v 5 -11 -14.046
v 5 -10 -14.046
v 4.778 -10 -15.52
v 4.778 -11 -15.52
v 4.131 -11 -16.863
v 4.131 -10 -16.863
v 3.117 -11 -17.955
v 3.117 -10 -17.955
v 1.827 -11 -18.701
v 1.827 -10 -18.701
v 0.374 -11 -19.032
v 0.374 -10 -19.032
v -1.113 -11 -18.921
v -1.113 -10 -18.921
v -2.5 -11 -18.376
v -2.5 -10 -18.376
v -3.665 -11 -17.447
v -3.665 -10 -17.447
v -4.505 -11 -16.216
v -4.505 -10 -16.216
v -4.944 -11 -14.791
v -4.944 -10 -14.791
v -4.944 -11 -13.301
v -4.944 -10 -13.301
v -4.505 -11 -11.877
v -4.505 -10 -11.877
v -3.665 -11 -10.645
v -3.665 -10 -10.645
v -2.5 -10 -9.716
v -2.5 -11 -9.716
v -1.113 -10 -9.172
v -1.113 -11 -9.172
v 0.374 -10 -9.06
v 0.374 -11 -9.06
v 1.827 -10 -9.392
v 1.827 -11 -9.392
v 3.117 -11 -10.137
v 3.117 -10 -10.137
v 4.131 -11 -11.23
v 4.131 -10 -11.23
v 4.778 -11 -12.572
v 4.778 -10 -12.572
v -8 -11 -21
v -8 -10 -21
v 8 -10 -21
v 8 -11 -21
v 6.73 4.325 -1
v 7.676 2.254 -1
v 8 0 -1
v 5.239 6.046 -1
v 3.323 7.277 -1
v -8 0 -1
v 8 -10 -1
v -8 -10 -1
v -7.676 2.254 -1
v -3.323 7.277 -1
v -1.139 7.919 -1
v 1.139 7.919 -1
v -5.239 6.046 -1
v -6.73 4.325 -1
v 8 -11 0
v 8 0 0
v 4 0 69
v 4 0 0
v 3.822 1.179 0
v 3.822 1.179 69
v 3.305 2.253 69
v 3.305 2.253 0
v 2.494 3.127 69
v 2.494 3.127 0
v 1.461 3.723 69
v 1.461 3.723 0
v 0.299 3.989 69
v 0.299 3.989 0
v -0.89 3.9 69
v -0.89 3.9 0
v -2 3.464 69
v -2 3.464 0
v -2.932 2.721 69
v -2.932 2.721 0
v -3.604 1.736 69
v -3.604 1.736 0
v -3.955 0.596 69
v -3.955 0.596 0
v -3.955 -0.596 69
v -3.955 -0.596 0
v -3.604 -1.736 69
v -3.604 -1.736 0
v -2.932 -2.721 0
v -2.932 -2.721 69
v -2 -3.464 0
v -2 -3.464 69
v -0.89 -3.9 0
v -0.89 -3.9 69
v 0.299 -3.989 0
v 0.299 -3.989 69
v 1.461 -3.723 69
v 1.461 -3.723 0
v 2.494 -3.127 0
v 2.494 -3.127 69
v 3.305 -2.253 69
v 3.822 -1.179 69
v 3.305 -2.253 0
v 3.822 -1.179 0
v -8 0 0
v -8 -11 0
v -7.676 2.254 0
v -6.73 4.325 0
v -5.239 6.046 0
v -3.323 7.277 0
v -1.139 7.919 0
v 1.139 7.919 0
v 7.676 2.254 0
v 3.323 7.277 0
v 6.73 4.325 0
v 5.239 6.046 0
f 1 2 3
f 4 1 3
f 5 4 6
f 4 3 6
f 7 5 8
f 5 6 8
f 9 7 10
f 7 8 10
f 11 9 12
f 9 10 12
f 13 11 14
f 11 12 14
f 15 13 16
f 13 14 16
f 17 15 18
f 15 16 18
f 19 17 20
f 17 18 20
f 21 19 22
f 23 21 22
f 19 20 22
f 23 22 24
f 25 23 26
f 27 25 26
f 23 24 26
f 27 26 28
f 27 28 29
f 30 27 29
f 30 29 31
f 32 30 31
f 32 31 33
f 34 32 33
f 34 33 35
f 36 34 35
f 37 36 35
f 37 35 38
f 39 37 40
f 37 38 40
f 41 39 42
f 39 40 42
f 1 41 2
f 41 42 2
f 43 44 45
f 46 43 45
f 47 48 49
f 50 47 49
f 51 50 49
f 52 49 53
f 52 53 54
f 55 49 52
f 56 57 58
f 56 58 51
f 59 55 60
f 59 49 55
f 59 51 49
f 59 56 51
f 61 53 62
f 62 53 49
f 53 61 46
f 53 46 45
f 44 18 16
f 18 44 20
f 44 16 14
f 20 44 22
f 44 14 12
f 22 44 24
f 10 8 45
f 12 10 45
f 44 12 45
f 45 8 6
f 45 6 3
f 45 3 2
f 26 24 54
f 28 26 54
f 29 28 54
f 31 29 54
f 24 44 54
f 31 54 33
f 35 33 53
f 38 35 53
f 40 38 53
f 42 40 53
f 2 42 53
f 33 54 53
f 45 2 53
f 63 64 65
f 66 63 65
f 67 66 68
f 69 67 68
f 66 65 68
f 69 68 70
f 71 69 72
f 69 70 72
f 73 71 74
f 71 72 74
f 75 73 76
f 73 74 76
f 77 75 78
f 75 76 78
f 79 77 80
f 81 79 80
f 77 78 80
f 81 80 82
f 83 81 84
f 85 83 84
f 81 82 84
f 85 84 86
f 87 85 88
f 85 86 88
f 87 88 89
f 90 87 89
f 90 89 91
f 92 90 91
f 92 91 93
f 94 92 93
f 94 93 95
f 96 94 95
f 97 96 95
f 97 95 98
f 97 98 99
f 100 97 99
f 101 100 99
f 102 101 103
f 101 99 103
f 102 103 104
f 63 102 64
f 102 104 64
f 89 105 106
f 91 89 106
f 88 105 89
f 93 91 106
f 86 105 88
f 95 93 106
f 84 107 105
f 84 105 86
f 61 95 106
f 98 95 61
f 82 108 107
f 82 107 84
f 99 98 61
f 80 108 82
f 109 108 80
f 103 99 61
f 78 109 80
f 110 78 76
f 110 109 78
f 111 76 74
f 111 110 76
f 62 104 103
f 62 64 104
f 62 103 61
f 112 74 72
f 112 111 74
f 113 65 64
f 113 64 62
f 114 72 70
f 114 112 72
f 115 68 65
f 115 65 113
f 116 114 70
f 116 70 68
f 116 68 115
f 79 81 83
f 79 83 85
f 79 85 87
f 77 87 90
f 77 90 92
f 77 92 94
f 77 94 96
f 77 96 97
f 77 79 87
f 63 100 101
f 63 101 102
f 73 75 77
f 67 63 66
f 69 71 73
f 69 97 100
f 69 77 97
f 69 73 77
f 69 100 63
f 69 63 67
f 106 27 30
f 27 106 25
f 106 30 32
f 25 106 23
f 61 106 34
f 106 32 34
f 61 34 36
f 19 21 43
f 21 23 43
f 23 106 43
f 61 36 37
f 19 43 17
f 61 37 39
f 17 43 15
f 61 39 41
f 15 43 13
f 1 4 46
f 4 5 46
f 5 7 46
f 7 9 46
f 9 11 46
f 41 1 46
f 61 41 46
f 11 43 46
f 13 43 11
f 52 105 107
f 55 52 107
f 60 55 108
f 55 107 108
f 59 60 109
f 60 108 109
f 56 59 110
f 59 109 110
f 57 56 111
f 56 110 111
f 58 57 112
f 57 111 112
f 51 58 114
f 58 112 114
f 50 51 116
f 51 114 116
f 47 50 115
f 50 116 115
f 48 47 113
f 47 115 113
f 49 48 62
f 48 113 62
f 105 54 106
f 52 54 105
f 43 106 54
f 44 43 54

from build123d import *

# Parameters (mm, degrees)
SKETCH1_R           = 4
BOSS_EXTRUDE1_DEPTH = 69
BOSS_EXTRUDE2_DEPTH = 1
SKETCH3_W           = 16
SKETCH3_H           = 20
BOSS_EXTRUDE3_DEPTH = 1
SKETCH4_W           = 16
SKETCH4_H           = 1
BOSS_EXTRUDE4_DEPTH = 1
SKETCH5_R           = 5
CUT_EXTRUDE1_DEPTH  = 1


with BuildPart() as part:
    # Sketch1 → Boss-Extrude1 (new body)
    with BuildSketch(Plane.XY):
        Circle(SKETCH1_R)
    extrude(amount=BOSS_EXTRUDE1_DEPTH)

    # Sketch2 → Boss-Extrude2 (add)
    with BuildSketch(Plane(origin=(0, 0, 0), x_dir=(-1, 0, 0), z_dir=(0, 0, -1))):
        with BuildLine():
            Line((-8, 0), (-8, -10))
            Line((-8, -10), (8, -10))
            Line((8, -10), (8, 0))
            ThreePointArc((8, 0), (0, 8), (-8, 0))
        make_face()
    extrude(amount=BOSS_EXTRUDE2_DEPTH)



with BuildPart() as body_2:
    # Sketch3 → Boss-Extrude3 (new body)
    with BuildSketch(Plane.XZ.offset(10)):
        with Locations((0, -11)):
            Rectangle(SKETCH3_W, SKETCH3_H)
    extrude(amount=BOSS_EXTRUDE3_DEPTH)


with BuildPart() as part_1:
    add(part.part)

    add(body_2.part)  # Boss-Extrude4 merges body 2
    # Sketch4 → Boss-Extrude4 (add)
    with BuildSketch(Plane.XY.offset(-1)):
        with Locations((0, -10.5)):
            Rectangle(SKETCH4_W, SKETCH4_H)
    extrude(amount=BOSS_EXTRUDE4_DEPTH)

    # Sketch5 → Cut-Extrude1 (cut)
    with BuildSketch(Plane(origin=(0, -10, 0), x_dir=(1, 0, 0), z_dir=(0, 1, 0))):
        with Locations((0, 14.046188681)):
            Circle(SKETCH5_R)
    extrude(amount=-CUT_EXTRUDE1_DEPTH, mode=Mode.SUBTRACT)


solid = part_1.part
